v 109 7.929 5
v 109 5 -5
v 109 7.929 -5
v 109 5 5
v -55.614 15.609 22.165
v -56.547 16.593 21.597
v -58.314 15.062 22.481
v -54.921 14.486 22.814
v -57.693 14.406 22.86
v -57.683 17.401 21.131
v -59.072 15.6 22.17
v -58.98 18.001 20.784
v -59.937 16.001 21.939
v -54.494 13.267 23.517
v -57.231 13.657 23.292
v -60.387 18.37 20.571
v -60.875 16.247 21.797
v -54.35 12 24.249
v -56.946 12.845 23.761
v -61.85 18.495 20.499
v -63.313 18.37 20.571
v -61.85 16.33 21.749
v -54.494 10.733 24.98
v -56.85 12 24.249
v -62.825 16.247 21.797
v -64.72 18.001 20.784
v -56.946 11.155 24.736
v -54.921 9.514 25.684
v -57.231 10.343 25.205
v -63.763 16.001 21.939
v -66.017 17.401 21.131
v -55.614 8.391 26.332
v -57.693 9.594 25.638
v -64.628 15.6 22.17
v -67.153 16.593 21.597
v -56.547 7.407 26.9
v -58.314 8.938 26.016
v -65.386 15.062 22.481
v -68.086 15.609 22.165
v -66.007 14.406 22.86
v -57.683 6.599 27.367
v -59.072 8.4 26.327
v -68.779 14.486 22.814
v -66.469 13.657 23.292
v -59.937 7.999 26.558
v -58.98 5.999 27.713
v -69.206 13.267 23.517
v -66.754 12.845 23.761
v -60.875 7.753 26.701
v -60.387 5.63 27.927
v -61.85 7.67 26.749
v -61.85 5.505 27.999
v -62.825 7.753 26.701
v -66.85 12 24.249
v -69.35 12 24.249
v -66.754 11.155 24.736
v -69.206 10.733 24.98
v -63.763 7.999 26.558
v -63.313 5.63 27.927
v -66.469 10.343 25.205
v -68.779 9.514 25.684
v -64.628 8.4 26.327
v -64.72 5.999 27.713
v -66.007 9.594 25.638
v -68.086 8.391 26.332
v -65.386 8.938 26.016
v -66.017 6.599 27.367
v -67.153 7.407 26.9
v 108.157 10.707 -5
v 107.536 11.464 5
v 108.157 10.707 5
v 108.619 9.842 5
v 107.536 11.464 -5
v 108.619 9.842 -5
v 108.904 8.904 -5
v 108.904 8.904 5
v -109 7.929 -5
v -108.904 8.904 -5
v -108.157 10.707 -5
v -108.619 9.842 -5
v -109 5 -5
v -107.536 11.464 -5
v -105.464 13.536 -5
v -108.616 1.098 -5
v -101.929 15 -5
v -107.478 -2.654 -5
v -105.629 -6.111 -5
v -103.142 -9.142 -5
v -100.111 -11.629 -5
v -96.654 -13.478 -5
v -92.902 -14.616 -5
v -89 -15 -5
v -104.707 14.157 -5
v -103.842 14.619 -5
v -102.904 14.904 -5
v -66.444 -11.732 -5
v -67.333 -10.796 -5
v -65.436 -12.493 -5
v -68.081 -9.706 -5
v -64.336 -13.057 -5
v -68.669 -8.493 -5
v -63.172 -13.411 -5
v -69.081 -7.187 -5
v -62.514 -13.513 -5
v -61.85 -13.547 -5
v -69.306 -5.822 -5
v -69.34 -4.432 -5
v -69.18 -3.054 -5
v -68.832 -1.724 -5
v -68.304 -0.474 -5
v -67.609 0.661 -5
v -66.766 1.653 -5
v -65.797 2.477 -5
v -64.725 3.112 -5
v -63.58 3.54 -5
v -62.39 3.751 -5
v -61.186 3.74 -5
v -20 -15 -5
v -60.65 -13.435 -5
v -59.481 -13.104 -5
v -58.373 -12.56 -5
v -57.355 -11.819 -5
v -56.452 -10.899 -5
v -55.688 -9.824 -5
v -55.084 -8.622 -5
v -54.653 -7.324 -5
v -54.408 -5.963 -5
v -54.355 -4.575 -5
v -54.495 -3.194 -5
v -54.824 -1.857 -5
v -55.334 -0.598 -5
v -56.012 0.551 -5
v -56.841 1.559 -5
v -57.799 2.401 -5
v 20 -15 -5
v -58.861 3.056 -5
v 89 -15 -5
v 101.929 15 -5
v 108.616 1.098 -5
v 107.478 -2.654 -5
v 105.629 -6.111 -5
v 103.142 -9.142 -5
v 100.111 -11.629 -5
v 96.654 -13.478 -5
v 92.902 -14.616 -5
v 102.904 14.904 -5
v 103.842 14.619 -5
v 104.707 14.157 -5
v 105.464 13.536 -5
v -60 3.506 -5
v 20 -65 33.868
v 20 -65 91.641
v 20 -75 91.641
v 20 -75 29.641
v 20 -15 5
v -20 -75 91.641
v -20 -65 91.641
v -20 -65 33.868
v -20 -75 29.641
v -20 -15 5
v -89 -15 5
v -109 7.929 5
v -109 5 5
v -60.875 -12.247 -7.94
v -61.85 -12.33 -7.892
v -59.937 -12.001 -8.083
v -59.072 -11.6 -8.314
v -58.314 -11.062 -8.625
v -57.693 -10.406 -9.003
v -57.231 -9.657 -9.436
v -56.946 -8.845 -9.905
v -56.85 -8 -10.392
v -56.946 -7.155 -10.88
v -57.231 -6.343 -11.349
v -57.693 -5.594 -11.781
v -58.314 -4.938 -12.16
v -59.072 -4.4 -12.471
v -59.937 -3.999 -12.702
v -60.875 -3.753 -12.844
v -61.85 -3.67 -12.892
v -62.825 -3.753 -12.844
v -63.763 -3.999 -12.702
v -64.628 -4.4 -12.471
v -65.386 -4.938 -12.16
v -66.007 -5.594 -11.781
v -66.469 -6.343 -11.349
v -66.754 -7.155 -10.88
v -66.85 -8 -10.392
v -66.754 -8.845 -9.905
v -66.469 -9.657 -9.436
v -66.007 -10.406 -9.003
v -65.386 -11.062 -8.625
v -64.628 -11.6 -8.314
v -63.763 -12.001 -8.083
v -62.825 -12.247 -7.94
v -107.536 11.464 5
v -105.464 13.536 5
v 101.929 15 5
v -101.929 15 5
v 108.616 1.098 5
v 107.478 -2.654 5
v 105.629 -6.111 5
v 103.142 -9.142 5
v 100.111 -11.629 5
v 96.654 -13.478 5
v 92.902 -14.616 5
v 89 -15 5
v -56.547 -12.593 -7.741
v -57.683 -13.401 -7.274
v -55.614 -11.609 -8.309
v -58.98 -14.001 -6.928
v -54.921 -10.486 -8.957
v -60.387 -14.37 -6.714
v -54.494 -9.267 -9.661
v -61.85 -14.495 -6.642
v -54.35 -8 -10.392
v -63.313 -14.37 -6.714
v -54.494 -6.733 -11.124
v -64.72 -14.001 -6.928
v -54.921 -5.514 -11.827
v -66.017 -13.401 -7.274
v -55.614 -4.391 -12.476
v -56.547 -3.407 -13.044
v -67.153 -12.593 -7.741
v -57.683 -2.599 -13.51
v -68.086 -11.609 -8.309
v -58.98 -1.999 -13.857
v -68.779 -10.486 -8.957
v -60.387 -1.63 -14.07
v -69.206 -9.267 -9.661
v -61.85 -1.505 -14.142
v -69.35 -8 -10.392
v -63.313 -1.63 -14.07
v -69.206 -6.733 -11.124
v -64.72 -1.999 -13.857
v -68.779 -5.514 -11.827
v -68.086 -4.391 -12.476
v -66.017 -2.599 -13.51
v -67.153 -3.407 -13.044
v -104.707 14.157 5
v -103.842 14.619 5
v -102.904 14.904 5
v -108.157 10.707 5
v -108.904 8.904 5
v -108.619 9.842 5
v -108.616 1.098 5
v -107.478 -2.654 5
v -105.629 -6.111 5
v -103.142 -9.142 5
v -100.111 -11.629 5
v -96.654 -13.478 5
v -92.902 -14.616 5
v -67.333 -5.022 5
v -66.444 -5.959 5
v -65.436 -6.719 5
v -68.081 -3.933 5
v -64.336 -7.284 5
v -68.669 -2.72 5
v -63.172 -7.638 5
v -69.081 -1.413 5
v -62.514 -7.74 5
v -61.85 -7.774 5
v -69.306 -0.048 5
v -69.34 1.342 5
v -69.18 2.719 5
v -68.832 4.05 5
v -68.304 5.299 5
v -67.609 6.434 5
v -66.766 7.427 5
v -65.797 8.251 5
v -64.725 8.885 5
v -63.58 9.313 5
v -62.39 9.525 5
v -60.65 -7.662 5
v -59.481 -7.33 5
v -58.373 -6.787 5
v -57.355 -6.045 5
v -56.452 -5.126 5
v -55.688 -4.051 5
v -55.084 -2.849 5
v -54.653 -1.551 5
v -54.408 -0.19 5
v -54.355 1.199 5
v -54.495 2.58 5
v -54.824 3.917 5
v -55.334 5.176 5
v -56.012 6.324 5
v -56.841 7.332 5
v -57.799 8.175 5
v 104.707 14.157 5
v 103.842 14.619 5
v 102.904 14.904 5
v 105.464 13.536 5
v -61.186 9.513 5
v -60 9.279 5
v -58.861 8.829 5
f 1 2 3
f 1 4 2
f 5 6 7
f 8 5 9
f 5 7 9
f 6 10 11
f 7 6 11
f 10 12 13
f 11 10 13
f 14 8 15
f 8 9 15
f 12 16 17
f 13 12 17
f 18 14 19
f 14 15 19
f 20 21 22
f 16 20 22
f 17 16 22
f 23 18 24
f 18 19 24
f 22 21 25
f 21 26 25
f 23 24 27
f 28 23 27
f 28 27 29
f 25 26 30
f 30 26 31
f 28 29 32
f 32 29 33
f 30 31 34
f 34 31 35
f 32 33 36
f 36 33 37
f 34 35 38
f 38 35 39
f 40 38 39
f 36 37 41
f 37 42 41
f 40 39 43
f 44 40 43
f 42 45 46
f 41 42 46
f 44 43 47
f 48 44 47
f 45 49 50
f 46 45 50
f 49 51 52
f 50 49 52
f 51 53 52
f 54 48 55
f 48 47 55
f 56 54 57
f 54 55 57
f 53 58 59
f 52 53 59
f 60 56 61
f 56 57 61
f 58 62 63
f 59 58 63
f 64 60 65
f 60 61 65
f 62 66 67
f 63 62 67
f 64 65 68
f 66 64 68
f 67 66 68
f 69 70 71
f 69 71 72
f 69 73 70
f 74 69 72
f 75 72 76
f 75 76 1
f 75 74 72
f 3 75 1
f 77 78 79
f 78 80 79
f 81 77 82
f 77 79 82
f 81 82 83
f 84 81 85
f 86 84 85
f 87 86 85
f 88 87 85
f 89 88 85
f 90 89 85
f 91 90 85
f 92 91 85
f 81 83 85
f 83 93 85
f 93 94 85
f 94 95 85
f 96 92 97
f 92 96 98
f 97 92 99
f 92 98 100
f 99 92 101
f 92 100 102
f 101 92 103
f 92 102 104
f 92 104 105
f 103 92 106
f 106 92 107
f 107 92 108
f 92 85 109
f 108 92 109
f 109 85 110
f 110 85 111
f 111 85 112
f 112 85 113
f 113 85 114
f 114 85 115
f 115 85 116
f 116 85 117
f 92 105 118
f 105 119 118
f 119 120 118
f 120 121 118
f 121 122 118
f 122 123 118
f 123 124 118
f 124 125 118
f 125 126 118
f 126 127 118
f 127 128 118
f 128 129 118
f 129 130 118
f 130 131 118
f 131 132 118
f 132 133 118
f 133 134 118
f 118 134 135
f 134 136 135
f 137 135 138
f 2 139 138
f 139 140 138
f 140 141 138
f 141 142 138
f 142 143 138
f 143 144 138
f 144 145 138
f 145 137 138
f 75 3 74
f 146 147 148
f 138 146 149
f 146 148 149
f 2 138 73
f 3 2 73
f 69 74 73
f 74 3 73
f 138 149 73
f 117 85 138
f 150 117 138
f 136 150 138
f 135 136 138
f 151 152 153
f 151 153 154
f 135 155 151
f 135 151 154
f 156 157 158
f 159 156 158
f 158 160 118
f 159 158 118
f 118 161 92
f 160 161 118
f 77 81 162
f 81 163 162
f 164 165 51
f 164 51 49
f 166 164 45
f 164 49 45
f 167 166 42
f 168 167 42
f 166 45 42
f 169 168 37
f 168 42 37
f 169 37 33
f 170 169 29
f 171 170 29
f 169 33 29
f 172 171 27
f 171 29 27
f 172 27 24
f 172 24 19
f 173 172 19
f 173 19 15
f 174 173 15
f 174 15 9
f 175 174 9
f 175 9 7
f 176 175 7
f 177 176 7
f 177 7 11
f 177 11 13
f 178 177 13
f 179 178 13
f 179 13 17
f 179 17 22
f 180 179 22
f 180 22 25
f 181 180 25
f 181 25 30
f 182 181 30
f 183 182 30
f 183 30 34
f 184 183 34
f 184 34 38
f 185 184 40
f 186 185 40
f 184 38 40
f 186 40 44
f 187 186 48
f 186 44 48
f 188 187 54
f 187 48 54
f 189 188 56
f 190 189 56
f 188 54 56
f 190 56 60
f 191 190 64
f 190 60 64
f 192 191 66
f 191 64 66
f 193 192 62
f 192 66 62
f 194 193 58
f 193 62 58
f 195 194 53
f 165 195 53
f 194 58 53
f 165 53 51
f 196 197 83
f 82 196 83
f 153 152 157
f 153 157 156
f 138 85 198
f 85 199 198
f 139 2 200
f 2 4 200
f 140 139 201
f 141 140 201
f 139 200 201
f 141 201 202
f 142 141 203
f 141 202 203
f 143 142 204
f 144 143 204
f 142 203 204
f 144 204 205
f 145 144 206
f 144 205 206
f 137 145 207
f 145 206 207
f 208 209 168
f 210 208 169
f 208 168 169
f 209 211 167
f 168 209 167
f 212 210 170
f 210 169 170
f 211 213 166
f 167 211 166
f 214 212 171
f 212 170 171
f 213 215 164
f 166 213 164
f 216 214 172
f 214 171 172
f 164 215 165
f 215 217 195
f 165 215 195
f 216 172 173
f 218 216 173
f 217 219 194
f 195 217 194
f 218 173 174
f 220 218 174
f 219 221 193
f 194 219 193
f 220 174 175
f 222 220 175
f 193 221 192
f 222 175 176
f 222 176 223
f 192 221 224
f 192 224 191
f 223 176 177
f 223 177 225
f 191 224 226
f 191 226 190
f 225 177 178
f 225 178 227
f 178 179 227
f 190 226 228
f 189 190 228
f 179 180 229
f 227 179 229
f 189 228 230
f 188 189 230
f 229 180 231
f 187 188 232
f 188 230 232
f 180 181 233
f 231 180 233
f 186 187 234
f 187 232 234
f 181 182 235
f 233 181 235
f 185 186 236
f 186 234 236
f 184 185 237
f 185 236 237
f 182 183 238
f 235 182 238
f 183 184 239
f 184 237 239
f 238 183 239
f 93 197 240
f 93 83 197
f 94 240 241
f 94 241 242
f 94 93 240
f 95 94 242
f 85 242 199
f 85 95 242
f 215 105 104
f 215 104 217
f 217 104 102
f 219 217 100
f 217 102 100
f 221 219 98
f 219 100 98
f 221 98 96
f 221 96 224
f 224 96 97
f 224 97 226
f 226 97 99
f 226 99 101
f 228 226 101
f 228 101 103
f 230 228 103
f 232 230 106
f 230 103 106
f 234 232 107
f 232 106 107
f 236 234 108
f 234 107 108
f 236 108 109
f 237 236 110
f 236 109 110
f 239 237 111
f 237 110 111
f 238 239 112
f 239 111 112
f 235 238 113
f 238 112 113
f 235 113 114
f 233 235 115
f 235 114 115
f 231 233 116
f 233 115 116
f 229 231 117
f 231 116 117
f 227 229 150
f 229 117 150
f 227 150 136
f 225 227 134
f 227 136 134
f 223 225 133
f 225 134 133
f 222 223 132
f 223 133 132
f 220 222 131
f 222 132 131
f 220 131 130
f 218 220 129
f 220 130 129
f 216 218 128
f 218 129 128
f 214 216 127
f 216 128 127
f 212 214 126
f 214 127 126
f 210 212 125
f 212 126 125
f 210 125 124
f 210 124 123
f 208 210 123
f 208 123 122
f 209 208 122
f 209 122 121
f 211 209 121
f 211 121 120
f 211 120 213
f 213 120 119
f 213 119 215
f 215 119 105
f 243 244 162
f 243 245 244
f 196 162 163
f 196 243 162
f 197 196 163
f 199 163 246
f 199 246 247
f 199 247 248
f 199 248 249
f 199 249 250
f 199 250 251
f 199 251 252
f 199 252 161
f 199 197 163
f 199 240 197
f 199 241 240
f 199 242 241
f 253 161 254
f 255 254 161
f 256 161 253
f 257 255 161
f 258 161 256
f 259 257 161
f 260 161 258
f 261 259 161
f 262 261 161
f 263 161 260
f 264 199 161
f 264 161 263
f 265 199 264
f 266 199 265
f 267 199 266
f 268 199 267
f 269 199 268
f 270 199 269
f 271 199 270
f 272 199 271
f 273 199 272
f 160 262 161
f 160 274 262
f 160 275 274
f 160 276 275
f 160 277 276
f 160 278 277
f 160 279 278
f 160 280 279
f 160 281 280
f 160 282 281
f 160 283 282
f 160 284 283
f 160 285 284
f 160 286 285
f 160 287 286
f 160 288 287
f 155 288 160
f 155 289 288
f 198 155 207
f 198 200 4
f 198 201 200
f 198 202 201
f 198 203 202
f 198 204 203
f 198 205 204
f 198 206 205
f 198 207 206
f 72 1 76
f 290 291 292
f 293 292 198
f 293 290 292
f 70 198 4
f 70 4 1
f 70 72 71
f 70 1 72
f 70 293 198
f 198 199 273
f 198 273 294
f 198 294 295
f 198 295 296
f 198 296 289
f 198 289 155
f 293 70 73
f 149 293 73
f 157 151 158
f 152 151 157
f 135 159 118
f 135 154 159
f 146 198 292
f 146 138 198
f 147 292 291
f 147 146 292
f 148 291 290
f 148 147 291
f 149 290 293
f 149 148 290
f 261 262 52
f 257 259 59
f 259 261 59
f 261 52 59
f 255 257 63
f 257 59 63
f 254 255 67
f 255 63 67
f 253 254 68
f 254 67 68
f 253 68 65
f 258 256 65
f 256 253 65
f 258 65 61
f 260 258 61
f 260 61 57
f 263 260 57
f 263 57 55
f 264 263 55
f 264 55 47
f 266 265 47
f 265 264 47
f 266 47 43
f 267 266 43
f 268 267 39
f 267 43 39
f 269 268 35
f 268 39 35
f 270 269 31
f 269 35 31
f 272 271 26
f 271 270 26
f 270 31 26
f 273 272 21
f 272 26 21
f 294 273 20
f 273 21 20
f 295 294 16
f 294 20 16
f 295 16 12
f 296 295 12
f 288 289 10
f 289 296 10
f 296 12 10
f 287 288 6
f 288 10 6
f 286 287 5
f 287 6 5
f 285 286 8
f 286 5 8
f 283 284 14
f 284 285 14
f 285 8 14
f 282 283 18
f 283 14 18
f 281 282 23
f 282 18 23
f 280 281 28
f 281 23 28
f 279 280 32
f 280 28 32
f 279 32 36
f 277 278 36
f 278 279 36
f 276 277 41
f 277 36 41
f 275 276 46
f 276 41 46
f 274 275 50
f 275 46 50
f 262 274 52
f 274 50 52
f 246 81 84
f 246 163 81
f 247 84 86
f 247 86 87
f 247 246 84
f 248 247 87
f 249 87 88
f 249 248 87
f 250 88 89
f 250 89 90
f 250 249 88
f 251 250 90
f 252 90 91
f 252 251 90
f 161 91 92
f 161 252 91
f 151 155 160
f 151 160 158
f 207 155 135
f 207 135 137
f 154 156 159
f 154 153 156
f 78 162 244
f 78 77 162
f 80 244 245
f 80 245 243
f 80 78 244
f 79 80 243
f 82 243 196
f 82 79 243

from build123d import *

# Parameters (mm, degrees)
SKETCH1_W           = 218
SKETCH1_H           = 30
BOSS_EXTRUDE1_DEPTH = 5
FILLET1_R           = 20
SKETCH4_R           = 5
CUT_EXTRUDE2_DEPTH  = 119.749210232
BOSS_EXTRUDE2_DEPTH = 20
CHAMFER2_SIZE       = 5
FILLET3_R           = 5


with BuildPart() as part:
    # Sketch1 → Boss-Extrude1 (new, symmetric)
    with BuildSketch(Plane.XY):
        Rectangle(SKETCH1_W, SKETCH1_H)
    extrude(amount=BOSS_EXTRUDE1_DEPTH, both=True)

    # Fillet1
    fillet1_edges = [part.edges().sort_by_distance(p)[0] for p in [
        (109, -15, 0),
        (-109, -15, 0),
    ]]
    fillet(fillet1_edges, radius=FILLET1_R)

    # Sketch3 → Revolve1 (revolve)
    with BuildSketch(Plane(origin=(-61.85, 0, 0), x_dir=(0, 0, -1), z_dir=(1, 0, 0)), mode=Mode.PRIVATE) as revolve1_sk:
        Polygon((-20.498711306, 18.495190528), (-24.248711306, 12), (10.392304845, -8), (14.142304845, -1.504809472), align=None)
    revolve(revolve1_sk.sketch.rotate(Axis((-61.85, 12, 24.248711306), (0, -0.49999999999999767, -0.86602540378444)), 180), axis=Axis((-61.85, 12, 24.248711306), (0, -0.49999999999999767, -0.86602540378444)))

    # Sketch4 → Cut-Extrude2 (cut, through all)
    with BuildSketch(Plane(origin=(0, 13.5, 23.382685902), x_dir=(1, 0, 0), z_dir=(0, 0.4999999999999978, 0.86602540378444))):
        with Locations(Location((-61.85, -1.732050808, 0), (0, 0, 270))):
            Circle(SKETCH4_R)
    extrude(amount=-CUT_EXTRUDE2_DEPTH, mode=Mode.SUBTRACT)

    # Sketch5 → Boss-Extrude2 (add, symmetric)
    with BuildSketch(Plane(origin=(0, 0, 0), x_dir=(0, 0, -1), z_dir=(1, 0, 0))):
        Polygon((5, -15), (-5, -15), (-33.867513459, -65), (-91.641016151, -65), (-91.641016151, -75), (-29.641016151, -75), align=None)
    extrude(amount=BOSS_EXTRUDE2_DEPTH, both=True)

    # Chamfer2
    chamfer2_edges = [part.edges().sort_by_distance(p)[0] for p in [
        (-109, 15, 0),
        (109, 15, 0),
    ]]
    chamfer(chamfer2_edges, length=CHAMFER2_SIZE)

    # Fillet3
    fillet3_edges = [part.edges().sort_by_distance(p)[0] for p in [
        (-109, 10, 0),
        (104, 15, 0),
        (-104, 15, 0),
        (109, 10, 0),
    ]]
    fillet(fillet3_edges, radius=FILLET3_R)


solid = part.part
